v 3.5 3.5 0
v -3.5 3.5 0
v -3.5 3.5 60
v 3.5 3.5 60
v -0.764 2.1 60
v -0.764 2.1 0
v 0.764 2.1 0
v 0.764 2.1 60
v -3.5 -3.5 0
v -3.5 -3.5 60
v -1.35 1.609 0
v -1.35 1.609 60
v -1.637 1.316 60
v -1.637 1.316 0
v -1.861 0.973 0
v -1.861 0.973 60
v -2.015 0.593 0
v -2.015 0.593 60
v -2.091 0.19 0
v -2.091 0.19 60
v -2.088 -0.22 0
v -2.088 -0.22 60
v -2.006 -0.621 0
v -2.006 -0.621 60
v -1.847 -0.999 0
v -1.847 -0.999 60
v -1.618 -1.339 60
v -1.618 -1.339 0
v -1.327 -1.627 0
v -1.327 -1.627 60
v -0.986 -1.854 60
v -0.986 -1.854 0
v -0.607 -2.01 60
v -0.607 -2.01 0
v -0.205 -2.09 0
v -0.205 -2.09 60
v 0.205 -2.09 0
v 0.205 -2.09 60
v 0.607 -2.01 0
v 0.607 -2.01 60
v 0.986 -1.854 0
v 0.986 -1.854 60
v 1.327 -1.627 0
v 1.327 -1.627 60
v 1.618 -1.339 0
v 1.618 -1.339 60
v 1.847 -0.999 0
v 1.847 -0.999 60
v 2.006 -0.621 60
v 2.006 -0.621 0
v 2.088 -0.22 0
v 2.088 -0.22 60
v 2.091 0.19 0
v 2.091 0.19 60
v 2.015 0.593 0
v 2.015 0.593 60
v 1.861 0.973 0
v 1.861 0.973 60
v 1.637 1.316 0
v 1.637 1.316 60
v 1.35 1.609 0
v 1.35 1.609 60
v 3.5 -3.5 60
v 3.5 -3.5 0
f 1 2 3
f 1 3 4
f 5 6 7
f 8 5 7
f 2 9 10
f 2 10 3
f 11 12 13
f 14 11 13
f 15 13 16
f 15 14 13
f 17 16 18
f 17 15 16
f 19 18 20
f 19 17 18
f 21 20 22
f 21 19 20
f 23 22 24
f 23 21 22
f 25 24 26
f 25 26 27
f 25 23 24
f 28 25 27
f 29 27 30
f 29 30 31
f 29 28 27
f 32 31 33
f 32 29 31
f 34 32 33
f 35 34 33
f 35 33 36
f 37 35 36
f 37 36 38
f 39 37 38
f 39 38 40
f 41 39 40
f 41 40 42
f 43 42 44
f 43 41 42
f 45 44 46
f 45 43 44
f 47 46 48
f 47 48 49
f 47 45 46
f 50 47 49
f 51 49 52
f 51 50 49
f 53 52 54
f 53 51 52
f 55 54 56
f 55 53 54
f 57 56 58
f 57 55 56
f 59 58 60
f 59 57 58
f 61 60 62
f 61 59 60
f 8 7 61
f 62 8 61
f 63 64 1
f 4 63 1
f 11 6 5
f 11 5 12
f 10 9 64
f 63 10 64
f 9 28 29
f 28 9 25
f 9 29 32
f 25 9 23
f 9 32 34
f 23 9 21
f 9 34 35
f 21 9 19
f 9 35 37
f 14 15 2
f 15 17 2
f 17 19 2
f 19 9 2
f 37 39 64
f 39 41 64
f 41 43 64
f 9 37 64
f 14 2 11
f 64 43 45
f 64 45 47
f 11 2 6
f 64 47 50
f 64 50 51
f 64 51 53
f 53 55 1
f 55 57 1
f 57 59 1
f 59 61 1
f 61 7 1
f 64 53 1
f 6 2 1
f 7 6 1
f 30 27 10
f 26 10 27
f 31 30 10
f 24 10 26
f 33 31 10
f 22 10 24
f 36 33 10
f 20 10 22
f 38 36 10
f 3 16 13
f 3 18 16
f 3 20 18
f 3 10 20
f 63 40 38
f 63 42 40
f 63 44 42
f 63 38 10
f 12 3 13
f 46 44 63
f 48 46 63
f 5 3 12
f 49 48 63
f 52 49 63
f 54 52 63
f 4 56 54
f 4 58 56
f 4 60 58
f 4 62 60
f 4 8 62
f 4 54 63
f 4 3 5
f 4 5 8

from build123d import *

# Parameters (mm, degrees)
SKETCH_W  = 7
SKETCH_H  = 7
PAD_DEPTH = 60


with BuildPart() as part:
    # Sketch → Pad (new body)
    with BuildSketch(Plane.XY):
        Rectangle(SKETCH_W, SKETCH_H)
        with BuildLine():
            ThreePointArc((-1.349854, 1.608693), (0, -2.1), (1.349854, 1.608693))
            Line((0.764337, 2.1), (1.349854, 1.608693))
            Line((-0.764337, 2.1), (0.764337, 2.1))
            Line((-0.764337, 2.1), (-1.349854, 1.608693))
        make_face(mode=Mode.SUBTRACT)
    extrude(amount=PAD_DEPTH)


solid = part.part
